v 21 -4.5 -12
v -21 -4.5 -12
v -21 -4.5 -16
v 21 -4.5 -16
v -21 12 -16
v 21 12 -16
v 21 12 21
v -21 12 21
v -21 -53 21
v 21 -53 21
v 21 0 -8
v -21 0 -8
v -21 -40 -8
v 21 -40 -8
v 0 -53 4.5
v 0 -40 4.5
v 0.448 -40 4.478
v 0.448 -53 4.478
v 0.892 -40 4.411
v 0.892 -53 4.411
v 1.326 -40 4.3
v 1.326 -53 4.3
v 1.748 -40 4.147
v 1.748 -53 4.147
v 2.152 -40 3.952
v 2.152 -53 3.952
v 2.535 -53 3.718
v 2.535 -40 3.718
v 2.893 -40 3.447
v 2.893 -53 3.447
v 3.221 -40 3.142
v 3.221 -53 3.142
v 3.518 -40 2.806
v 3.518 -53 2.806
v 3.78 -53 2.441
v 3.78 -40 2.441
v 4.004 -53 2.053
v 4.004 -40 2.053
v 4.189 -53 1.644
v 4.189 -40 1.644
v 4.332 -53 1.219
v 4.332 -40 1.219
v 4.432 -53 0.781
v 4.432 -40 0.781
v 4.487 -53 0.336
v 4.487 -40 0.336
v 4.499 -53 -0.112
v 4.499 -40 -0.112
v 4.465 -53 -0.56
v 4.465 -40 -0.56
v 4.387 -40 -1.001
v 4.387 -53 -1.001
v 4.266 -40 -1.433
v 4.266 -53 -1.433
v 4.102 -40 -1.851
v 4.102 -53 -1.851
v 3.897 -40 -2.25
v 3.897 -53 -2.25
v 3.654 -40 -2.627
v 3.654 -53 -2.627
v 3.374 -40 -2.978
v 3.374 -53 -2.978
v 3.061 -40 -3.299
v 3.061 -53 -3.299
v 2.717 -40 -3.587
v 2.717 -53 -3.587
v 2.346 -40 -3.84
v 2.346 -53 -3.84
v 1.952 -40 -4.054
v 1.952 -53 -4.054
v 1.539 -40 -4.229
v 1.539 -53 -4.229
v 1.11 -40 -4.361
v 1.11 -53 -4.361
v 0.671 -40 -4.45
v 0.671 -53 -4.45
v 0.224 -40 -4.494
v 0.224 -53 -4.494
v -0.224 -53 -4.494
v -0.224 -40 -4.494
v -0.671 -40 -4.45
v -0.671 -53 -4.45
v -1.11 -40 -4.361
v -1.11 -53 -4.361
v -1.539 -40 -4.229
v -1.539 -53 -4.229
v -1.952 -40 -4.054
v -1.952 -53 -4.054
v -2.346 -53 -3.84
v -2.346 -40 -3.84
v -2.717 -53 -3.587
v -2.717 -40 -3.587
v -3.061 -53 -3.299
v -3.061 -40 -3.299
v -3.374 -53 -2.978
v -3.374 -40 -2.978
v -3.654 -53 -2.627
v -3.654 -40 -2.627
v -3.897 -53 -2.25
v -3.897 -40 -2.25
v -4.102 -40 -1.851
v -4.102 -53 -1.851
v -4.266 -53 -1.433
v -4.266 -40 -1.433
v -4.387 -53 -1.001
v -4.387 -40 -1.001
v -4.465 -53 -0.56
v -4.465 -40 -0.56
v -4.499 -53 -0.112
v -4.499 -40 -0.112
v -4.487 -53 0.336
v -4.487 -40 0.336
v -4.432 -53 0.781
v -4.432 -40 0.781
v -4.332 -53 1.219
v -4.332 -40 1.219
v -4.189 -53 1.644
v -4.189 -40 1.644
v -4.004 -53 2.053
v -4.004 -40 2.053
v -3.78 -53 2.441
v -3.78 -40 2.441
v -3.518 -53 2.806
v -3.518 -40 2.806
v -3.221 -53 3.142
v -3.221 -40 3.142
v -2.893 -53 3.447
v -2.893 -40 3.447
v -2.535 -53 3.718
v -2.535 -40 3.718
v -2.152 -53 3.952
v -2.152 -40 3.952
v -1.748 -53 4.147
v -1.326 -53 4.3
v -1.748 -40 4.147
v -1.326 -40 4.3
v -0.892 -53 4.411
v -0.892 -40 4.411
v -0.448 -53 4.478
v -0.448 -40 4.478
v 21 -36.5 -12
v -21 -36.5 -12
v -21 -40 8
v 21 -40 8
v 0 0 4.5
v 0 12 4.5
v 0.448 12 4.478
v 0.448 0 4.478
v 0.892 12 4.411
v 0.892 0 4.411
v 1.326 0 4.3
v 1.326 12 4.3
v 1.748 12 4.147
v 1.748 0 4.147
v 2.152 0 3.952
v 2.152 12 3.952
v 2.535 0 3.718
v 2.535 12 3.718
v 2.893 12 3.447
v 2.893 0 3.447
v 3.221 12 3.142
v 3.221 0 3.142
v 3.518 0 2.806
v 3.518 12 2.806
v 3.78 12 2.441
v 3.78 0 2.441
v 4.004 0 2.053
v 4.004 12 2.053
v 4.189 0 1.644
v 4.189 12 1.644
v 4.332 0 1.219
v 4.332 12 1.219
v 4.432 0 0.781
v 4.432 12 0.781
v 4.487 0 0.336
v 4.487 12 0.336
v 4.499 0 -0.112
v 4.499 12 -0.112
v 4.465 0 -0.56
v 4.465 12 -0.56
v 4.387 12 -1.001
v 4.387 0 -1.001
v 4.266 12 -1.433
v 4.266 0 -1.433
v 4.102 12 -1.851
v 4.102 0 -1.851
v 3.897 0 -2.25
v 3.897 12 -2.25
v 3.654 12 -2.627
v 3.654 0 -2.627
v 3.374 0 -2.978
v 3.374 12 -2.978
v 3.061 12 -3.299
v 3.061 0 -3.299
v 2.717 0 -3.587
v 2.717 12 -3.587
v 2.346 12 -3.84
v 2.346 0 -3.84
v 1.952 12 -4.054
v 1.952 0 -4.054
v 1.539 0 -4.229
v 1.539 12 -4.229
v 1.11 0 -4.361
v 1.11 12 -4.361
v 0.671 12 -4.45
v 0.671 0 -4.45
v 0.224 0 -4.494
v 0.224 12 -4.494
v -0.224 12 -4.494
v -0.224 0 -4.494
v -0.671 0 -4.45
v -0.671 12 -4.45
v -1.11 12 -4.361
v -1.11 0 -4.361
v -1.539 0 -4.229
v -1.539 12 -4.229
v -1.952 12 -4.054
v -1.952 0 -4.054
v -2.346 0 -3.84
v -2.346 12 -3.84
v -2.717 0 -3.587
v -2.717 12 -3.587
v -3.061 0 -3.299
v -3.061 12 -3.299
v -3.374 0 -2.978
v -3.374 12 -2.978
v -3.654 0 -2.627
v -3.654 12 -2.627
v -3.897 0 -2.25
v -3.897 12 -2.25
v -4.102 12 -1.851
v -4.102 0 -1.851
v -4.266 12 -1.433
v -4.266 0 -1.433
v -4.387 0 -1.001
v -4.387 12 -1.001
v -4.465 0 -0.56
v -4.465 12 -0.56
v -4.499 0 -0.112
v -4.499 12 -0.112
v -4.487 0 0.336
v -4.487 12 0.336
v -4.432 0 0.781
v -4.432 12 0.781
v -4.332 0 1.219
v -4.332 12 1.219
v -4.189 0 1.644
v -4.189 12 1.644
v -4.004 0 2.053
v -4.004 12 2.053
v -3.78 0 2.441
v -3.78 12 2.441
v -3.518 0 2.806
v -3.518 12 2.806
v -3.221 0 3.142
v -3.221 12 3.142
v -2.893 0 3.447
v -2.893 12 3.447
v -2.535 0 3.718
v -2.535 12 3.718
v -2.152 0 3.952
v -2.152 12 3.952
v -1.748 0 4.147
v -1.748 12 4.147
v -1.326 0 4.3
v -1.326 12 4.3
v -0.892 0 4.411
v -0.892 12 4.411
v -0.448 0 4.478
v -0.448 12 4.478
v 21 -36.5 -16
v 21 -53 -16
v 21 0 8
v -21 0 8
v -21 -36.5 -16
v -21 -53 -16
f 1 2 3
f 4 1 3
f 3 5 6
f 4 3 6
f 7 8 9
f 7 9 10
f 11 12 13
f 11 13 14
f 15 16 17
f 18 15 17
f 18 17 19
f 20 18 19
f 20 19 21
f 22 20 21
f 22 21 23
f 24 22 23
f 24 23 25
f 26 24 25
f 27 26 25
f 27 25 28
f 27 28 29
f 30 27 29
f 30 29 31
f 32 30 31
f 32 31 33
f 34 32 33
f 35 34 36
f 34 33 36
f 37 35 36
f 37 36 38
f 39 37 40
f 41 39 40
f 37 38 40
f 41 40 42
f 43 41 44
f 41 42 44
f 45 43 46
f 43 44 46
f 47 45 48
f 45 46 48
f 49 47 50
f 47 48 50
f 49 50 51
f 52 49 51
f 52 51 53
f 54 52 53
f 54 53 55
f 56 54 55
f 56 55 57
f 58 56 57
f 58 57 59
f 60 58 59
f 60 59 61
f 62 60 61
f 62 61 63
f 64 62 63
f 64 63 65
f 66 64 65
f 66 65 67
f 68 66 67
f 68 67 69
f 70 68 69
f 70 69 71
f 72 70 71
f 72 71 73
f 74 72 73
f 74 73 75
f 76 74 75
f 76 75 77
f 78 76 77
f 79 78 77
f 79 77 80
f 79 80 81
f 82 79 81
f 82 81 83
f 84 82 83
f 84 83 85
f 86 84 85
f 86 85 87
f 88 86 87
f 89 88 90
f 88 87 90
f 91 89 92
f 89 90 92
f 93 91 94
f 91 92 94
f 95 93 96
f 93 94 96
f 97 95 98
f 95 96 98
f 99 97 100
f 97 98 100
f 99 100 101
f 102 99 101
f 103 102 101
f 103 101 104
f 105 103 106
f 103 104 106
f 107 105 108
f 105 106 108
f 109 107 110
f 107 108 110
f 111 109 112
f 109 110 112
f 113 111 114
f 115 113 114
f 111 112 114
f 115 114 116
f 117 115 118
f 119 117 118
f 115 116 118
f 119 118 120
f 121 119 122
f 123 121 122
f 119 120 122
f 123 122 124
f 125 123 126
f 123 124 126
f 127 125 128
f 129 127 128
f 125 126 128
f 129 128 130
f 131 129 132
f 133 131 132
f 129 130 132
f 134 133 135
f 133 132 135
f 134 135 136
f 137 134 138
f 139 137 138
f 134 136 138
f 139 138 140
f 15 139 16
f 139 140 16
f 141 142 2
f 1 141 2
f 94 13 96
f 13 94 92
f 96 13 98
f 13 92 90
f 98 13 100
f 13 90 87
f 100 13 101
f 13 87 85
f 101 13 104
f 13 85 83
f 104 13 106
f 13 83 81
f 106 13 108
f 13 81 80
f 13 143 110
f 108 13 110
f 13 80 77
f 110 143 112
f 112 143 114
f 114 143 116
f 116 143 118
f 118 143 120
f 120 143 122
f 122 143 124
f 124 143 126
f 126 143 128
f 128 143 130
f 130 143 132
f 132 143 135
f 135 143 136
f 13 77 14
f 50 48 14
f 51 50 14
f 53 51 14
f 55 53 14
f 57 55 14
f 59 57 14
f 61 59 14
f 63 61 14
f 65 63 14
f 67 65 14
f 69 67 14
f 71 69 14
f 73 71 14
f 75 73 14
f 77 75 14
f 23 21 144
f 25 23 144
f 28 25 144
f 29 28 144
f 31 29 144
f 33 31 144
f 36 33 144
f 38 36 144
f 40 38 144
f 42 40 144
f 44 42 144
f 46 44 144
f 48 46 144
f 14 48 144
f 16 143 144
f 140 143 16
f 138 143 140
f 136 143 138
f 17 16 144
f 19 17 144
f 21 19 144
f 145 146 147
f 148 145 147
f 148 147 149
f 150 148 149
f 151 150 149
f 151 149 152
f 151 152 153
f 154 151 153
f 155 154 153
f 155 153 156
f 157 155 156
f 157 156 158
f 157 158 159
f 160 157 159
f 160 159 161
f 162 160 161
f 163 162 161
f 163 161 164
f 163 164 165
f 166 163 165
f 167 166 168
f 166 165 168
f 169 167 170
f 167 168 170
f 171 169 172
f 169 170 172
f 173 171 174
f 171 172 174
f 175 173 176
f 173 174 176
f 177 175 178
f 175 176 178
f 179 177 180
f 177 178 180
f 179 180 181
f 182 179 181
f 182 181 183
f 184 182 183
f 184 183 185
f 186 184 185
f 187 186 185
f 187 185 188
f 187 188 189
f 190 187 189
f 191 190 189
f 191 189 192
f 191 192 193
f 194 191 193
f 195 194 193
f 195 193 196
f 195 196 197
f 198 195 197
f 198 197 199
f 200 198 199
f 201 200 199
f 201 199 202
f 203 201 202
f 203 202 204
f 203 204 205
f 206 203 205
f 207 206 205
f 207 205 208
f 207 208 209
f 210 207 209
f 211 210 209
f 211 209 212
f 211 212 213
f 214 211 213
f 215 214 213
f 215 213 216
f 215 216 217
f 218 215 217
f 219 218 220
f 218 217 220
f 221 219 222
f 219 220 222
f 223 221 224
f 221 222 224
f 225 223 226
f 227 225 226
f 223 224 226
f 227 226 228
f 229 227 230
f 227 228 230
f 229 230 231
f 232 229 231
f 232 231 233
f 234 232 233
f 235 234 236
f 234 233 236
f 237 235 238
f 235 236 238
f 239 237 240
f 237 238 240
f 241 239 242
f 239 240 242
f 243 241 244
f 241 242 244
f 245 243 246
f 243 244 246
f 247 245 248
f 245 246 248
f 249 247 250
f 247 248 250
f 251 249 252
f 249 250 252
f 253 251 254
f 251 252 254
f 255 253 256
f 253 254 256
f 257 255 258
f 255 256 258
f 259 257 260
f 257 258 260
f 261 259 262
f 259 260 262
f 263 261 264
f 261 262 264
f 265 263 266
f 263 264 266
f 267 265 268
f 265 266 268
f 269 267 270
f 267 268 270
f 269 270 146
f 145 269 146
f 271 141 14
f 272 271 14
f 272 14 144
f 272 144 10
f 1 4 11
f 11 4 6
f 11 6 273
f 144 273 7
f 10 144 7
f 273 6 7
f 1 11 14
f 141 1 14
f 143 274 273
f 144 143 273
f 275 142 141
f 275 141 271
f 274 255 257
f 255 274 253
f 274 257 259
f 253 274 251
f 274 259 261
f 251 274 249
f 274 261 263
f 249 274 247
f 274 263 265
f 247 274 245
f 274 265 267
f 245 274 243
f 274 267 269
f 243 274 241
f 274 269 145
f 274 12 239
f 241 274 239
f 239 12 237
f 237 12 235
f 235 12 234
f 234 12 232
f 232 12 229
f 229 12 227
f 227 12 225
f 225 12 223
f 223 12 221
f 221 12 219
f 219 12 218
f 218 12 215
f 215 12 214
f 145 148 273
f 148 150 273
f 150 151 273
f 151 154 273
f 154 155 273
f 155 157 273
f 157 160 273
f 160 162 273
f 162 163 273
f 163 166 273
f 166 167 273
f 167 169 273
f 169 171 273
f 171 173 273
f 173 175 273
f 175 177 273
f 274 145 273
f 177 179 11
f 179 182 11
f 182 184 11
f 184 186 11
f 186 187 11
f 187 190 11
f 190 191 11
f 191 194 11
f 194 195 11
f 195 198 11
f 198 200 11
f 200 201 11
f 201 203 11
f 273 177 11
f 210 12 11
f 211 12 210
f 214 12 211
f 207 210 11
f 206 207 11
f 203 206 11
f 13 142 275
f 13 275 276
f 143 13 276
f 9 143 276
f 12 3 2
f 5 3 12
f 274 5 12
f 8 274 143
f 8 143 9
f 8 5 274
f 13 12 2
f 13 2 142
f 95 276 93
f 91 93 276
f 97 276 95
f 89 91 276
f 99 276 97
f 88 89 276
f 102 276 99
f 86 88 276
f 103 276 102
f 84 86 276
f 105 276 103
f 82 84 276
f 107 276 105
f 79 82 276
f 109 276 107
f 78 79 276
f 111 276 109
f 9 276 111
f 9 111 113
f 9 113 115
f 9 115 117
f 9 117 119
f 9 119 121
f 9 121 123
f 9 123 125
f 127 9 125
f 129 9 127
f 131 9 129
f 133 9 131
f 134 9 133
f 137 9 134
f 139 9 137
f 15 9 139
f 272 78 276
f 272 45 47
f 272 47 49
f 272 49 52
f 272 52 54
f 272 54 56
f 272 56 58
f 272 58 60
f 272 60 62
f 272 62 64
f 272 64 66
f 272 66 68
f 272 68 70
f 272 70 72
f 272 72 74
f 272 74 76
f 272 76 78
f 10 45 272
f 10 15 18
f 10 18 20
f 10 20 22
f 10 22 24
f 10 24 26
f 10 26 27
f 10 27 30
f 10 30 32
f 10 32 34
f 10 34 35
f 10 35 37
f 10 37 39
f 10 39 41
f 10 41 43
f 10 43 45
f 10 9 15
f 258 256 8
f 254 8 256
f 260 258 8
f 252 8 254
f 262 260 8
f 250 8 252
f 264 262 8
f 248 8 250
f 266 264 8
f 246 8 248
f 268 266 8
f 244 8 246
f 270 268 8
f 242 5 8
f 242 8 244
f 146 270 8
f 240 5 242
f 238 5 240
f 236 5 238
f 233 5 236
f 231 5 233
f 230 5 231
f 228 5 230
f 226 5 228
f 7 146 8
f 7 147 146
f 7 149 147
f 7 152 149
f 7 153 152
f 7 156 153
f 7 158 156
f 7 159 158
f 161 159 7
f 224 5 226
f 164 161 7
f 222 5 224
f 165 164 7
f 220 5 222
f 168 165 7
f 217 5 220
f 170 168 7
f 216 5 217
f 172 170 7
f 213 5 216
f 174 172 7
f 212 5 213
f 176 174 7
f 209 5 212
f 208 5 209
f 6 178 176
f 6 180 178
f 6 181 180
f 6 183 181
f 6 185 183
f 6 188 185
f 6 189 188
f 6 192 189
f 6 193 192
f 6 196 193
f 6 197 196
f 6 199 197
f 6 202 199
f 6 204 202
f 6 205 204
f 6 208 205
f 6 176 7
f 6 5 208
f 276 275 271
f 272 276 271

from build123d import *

# Parameters (mm, degrees)
ESQUISSE1_W             = 42
ESQUISSE1_H             = 42
BOSS_EXTRU_6_DEPTH      = 12
ESQUISSE9_W             = 42
ESQUISSE9_H             = 13
BOSS_EXTRU_7_DEPTH      = 40
ESQUISSE10_W            = 42
ESQUISSE10_H            = 42
BOSS_EXTRU_8_DEPTH      = 13
ESQUISSE12_R            = 4.5
ENL_V_MAT_EXTRU_3_DEPTH = 72.463277283
ESQUISSE13_W            = 42
ESQUISSE13_H            = 5
ENL_V_MAT_EXTRU_4_DEPTH = 72.463277283
ESQUISSE15_W            = 4
ESQUISSE15_H            = 32
ENL_V_MAT_EXTRU_5_DEPTH = 71.809603868


with BuildPart() as part:
    # Esquisse1 → Boss.-Extru.6 (new body)
    with BuildSketch(Plane(origin=(0, 0, 0), x_dir=(1, 0, 0), z_dir=(0, 1, 0))):
        Rectangle(ESQUISSE1_W, ESQUISSE1_H)
    extrude(amount=BOSS_EXTRU_6_DEPTH)

    # Esquisse9 → Boss.-Extru.7 (add)
    with BuildSketch(Plane.XZ):
        with Locations((0, -14.5)):
            Rectangle(ESQUISSE9_W, ESQUISSE9_H)
        with Locations((0, 14.5)):
            Rectangle(ESQUISSE9_W, ESQUISSE9_H)
    extrude(amount=BOSS_EXTRU_7_DEPTH)

    # Esquisse10 → Boss.-Extru.8 (add)
    with BuildSketch(Plane.XZ.offset(40)):
        Rectangle(ESQUISSE10_W, ESQUISSE10_H)
    extrude(amount=BOSS_EXTRU_8_DEPTH)

    # Esquisse12 → Enlèv. mat.-Extru.3 (cut, through all)
    with BuildSketch(Plane(origin=(0, 12, 0), x_dir=(1, 0, 0), z_dir=(0, 1, 0))):
        with Locations(Location((0, 0, 0), (0, 0, 270))):
            Circle(ESQUISSE12_R)
    extrude(amount=-ENL_V_MAT_EXTRU_3_DEPTH, mode=Mode.SUBTRACT)

    # Esquisse13 → Enlèv. mat.-Extru.4 (cut, through all)
    with BuildSketch(Plane(origin=(0, 12, 0), x_dir=(1, 0, 0), z_dir=(0, 1, 0))):
        with Locations((0, 18.5)):
            Rectangle(ESQUISSE13_W, ESQUISSE13_H)
    extrude(amount=-ENL_V_MAT_EXTRU_4_DEPTH, mode=Mode.SUBTRACT)

    # Esquisse15 → Enlèv. mat.-Extru.5 (cut, through all)
    with BuildSketch(Plane(origin=(21, 0, 0), x_dir=(0, 0, -1), z_dir=(1, 0, 0))):
        with Locations((14, -20.5)):
            Rectangle(ESQUISSE15_W, ESQUISSE15_H)
    extrude(amount=-ENL_V_MAT_EXTRU_5_DEPTH, mode=Mode.SUBTRACT)


solid = part.part
